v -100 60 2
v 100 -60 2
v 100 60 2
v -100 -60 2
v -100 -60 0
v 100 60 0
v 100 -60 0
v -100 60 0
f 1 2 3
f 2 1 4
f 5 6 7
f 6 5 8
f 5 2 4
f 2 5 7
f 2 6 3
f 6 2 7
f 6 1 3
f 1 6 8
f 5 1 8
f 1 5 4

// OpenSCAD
$fn = 64;

length = 200;   // mm
width  = 120;   // mm
thickness = 2;  // mm

module sheet_mild_steel(l=length, w=width, t=thickness) {
    color([0.55, 0.55, 0.58])  // mild steel-like gray
        translate([-l/2, -w/2, 0])
            cube([l, w, t], center=false);
}

sheet_mild_steel();
